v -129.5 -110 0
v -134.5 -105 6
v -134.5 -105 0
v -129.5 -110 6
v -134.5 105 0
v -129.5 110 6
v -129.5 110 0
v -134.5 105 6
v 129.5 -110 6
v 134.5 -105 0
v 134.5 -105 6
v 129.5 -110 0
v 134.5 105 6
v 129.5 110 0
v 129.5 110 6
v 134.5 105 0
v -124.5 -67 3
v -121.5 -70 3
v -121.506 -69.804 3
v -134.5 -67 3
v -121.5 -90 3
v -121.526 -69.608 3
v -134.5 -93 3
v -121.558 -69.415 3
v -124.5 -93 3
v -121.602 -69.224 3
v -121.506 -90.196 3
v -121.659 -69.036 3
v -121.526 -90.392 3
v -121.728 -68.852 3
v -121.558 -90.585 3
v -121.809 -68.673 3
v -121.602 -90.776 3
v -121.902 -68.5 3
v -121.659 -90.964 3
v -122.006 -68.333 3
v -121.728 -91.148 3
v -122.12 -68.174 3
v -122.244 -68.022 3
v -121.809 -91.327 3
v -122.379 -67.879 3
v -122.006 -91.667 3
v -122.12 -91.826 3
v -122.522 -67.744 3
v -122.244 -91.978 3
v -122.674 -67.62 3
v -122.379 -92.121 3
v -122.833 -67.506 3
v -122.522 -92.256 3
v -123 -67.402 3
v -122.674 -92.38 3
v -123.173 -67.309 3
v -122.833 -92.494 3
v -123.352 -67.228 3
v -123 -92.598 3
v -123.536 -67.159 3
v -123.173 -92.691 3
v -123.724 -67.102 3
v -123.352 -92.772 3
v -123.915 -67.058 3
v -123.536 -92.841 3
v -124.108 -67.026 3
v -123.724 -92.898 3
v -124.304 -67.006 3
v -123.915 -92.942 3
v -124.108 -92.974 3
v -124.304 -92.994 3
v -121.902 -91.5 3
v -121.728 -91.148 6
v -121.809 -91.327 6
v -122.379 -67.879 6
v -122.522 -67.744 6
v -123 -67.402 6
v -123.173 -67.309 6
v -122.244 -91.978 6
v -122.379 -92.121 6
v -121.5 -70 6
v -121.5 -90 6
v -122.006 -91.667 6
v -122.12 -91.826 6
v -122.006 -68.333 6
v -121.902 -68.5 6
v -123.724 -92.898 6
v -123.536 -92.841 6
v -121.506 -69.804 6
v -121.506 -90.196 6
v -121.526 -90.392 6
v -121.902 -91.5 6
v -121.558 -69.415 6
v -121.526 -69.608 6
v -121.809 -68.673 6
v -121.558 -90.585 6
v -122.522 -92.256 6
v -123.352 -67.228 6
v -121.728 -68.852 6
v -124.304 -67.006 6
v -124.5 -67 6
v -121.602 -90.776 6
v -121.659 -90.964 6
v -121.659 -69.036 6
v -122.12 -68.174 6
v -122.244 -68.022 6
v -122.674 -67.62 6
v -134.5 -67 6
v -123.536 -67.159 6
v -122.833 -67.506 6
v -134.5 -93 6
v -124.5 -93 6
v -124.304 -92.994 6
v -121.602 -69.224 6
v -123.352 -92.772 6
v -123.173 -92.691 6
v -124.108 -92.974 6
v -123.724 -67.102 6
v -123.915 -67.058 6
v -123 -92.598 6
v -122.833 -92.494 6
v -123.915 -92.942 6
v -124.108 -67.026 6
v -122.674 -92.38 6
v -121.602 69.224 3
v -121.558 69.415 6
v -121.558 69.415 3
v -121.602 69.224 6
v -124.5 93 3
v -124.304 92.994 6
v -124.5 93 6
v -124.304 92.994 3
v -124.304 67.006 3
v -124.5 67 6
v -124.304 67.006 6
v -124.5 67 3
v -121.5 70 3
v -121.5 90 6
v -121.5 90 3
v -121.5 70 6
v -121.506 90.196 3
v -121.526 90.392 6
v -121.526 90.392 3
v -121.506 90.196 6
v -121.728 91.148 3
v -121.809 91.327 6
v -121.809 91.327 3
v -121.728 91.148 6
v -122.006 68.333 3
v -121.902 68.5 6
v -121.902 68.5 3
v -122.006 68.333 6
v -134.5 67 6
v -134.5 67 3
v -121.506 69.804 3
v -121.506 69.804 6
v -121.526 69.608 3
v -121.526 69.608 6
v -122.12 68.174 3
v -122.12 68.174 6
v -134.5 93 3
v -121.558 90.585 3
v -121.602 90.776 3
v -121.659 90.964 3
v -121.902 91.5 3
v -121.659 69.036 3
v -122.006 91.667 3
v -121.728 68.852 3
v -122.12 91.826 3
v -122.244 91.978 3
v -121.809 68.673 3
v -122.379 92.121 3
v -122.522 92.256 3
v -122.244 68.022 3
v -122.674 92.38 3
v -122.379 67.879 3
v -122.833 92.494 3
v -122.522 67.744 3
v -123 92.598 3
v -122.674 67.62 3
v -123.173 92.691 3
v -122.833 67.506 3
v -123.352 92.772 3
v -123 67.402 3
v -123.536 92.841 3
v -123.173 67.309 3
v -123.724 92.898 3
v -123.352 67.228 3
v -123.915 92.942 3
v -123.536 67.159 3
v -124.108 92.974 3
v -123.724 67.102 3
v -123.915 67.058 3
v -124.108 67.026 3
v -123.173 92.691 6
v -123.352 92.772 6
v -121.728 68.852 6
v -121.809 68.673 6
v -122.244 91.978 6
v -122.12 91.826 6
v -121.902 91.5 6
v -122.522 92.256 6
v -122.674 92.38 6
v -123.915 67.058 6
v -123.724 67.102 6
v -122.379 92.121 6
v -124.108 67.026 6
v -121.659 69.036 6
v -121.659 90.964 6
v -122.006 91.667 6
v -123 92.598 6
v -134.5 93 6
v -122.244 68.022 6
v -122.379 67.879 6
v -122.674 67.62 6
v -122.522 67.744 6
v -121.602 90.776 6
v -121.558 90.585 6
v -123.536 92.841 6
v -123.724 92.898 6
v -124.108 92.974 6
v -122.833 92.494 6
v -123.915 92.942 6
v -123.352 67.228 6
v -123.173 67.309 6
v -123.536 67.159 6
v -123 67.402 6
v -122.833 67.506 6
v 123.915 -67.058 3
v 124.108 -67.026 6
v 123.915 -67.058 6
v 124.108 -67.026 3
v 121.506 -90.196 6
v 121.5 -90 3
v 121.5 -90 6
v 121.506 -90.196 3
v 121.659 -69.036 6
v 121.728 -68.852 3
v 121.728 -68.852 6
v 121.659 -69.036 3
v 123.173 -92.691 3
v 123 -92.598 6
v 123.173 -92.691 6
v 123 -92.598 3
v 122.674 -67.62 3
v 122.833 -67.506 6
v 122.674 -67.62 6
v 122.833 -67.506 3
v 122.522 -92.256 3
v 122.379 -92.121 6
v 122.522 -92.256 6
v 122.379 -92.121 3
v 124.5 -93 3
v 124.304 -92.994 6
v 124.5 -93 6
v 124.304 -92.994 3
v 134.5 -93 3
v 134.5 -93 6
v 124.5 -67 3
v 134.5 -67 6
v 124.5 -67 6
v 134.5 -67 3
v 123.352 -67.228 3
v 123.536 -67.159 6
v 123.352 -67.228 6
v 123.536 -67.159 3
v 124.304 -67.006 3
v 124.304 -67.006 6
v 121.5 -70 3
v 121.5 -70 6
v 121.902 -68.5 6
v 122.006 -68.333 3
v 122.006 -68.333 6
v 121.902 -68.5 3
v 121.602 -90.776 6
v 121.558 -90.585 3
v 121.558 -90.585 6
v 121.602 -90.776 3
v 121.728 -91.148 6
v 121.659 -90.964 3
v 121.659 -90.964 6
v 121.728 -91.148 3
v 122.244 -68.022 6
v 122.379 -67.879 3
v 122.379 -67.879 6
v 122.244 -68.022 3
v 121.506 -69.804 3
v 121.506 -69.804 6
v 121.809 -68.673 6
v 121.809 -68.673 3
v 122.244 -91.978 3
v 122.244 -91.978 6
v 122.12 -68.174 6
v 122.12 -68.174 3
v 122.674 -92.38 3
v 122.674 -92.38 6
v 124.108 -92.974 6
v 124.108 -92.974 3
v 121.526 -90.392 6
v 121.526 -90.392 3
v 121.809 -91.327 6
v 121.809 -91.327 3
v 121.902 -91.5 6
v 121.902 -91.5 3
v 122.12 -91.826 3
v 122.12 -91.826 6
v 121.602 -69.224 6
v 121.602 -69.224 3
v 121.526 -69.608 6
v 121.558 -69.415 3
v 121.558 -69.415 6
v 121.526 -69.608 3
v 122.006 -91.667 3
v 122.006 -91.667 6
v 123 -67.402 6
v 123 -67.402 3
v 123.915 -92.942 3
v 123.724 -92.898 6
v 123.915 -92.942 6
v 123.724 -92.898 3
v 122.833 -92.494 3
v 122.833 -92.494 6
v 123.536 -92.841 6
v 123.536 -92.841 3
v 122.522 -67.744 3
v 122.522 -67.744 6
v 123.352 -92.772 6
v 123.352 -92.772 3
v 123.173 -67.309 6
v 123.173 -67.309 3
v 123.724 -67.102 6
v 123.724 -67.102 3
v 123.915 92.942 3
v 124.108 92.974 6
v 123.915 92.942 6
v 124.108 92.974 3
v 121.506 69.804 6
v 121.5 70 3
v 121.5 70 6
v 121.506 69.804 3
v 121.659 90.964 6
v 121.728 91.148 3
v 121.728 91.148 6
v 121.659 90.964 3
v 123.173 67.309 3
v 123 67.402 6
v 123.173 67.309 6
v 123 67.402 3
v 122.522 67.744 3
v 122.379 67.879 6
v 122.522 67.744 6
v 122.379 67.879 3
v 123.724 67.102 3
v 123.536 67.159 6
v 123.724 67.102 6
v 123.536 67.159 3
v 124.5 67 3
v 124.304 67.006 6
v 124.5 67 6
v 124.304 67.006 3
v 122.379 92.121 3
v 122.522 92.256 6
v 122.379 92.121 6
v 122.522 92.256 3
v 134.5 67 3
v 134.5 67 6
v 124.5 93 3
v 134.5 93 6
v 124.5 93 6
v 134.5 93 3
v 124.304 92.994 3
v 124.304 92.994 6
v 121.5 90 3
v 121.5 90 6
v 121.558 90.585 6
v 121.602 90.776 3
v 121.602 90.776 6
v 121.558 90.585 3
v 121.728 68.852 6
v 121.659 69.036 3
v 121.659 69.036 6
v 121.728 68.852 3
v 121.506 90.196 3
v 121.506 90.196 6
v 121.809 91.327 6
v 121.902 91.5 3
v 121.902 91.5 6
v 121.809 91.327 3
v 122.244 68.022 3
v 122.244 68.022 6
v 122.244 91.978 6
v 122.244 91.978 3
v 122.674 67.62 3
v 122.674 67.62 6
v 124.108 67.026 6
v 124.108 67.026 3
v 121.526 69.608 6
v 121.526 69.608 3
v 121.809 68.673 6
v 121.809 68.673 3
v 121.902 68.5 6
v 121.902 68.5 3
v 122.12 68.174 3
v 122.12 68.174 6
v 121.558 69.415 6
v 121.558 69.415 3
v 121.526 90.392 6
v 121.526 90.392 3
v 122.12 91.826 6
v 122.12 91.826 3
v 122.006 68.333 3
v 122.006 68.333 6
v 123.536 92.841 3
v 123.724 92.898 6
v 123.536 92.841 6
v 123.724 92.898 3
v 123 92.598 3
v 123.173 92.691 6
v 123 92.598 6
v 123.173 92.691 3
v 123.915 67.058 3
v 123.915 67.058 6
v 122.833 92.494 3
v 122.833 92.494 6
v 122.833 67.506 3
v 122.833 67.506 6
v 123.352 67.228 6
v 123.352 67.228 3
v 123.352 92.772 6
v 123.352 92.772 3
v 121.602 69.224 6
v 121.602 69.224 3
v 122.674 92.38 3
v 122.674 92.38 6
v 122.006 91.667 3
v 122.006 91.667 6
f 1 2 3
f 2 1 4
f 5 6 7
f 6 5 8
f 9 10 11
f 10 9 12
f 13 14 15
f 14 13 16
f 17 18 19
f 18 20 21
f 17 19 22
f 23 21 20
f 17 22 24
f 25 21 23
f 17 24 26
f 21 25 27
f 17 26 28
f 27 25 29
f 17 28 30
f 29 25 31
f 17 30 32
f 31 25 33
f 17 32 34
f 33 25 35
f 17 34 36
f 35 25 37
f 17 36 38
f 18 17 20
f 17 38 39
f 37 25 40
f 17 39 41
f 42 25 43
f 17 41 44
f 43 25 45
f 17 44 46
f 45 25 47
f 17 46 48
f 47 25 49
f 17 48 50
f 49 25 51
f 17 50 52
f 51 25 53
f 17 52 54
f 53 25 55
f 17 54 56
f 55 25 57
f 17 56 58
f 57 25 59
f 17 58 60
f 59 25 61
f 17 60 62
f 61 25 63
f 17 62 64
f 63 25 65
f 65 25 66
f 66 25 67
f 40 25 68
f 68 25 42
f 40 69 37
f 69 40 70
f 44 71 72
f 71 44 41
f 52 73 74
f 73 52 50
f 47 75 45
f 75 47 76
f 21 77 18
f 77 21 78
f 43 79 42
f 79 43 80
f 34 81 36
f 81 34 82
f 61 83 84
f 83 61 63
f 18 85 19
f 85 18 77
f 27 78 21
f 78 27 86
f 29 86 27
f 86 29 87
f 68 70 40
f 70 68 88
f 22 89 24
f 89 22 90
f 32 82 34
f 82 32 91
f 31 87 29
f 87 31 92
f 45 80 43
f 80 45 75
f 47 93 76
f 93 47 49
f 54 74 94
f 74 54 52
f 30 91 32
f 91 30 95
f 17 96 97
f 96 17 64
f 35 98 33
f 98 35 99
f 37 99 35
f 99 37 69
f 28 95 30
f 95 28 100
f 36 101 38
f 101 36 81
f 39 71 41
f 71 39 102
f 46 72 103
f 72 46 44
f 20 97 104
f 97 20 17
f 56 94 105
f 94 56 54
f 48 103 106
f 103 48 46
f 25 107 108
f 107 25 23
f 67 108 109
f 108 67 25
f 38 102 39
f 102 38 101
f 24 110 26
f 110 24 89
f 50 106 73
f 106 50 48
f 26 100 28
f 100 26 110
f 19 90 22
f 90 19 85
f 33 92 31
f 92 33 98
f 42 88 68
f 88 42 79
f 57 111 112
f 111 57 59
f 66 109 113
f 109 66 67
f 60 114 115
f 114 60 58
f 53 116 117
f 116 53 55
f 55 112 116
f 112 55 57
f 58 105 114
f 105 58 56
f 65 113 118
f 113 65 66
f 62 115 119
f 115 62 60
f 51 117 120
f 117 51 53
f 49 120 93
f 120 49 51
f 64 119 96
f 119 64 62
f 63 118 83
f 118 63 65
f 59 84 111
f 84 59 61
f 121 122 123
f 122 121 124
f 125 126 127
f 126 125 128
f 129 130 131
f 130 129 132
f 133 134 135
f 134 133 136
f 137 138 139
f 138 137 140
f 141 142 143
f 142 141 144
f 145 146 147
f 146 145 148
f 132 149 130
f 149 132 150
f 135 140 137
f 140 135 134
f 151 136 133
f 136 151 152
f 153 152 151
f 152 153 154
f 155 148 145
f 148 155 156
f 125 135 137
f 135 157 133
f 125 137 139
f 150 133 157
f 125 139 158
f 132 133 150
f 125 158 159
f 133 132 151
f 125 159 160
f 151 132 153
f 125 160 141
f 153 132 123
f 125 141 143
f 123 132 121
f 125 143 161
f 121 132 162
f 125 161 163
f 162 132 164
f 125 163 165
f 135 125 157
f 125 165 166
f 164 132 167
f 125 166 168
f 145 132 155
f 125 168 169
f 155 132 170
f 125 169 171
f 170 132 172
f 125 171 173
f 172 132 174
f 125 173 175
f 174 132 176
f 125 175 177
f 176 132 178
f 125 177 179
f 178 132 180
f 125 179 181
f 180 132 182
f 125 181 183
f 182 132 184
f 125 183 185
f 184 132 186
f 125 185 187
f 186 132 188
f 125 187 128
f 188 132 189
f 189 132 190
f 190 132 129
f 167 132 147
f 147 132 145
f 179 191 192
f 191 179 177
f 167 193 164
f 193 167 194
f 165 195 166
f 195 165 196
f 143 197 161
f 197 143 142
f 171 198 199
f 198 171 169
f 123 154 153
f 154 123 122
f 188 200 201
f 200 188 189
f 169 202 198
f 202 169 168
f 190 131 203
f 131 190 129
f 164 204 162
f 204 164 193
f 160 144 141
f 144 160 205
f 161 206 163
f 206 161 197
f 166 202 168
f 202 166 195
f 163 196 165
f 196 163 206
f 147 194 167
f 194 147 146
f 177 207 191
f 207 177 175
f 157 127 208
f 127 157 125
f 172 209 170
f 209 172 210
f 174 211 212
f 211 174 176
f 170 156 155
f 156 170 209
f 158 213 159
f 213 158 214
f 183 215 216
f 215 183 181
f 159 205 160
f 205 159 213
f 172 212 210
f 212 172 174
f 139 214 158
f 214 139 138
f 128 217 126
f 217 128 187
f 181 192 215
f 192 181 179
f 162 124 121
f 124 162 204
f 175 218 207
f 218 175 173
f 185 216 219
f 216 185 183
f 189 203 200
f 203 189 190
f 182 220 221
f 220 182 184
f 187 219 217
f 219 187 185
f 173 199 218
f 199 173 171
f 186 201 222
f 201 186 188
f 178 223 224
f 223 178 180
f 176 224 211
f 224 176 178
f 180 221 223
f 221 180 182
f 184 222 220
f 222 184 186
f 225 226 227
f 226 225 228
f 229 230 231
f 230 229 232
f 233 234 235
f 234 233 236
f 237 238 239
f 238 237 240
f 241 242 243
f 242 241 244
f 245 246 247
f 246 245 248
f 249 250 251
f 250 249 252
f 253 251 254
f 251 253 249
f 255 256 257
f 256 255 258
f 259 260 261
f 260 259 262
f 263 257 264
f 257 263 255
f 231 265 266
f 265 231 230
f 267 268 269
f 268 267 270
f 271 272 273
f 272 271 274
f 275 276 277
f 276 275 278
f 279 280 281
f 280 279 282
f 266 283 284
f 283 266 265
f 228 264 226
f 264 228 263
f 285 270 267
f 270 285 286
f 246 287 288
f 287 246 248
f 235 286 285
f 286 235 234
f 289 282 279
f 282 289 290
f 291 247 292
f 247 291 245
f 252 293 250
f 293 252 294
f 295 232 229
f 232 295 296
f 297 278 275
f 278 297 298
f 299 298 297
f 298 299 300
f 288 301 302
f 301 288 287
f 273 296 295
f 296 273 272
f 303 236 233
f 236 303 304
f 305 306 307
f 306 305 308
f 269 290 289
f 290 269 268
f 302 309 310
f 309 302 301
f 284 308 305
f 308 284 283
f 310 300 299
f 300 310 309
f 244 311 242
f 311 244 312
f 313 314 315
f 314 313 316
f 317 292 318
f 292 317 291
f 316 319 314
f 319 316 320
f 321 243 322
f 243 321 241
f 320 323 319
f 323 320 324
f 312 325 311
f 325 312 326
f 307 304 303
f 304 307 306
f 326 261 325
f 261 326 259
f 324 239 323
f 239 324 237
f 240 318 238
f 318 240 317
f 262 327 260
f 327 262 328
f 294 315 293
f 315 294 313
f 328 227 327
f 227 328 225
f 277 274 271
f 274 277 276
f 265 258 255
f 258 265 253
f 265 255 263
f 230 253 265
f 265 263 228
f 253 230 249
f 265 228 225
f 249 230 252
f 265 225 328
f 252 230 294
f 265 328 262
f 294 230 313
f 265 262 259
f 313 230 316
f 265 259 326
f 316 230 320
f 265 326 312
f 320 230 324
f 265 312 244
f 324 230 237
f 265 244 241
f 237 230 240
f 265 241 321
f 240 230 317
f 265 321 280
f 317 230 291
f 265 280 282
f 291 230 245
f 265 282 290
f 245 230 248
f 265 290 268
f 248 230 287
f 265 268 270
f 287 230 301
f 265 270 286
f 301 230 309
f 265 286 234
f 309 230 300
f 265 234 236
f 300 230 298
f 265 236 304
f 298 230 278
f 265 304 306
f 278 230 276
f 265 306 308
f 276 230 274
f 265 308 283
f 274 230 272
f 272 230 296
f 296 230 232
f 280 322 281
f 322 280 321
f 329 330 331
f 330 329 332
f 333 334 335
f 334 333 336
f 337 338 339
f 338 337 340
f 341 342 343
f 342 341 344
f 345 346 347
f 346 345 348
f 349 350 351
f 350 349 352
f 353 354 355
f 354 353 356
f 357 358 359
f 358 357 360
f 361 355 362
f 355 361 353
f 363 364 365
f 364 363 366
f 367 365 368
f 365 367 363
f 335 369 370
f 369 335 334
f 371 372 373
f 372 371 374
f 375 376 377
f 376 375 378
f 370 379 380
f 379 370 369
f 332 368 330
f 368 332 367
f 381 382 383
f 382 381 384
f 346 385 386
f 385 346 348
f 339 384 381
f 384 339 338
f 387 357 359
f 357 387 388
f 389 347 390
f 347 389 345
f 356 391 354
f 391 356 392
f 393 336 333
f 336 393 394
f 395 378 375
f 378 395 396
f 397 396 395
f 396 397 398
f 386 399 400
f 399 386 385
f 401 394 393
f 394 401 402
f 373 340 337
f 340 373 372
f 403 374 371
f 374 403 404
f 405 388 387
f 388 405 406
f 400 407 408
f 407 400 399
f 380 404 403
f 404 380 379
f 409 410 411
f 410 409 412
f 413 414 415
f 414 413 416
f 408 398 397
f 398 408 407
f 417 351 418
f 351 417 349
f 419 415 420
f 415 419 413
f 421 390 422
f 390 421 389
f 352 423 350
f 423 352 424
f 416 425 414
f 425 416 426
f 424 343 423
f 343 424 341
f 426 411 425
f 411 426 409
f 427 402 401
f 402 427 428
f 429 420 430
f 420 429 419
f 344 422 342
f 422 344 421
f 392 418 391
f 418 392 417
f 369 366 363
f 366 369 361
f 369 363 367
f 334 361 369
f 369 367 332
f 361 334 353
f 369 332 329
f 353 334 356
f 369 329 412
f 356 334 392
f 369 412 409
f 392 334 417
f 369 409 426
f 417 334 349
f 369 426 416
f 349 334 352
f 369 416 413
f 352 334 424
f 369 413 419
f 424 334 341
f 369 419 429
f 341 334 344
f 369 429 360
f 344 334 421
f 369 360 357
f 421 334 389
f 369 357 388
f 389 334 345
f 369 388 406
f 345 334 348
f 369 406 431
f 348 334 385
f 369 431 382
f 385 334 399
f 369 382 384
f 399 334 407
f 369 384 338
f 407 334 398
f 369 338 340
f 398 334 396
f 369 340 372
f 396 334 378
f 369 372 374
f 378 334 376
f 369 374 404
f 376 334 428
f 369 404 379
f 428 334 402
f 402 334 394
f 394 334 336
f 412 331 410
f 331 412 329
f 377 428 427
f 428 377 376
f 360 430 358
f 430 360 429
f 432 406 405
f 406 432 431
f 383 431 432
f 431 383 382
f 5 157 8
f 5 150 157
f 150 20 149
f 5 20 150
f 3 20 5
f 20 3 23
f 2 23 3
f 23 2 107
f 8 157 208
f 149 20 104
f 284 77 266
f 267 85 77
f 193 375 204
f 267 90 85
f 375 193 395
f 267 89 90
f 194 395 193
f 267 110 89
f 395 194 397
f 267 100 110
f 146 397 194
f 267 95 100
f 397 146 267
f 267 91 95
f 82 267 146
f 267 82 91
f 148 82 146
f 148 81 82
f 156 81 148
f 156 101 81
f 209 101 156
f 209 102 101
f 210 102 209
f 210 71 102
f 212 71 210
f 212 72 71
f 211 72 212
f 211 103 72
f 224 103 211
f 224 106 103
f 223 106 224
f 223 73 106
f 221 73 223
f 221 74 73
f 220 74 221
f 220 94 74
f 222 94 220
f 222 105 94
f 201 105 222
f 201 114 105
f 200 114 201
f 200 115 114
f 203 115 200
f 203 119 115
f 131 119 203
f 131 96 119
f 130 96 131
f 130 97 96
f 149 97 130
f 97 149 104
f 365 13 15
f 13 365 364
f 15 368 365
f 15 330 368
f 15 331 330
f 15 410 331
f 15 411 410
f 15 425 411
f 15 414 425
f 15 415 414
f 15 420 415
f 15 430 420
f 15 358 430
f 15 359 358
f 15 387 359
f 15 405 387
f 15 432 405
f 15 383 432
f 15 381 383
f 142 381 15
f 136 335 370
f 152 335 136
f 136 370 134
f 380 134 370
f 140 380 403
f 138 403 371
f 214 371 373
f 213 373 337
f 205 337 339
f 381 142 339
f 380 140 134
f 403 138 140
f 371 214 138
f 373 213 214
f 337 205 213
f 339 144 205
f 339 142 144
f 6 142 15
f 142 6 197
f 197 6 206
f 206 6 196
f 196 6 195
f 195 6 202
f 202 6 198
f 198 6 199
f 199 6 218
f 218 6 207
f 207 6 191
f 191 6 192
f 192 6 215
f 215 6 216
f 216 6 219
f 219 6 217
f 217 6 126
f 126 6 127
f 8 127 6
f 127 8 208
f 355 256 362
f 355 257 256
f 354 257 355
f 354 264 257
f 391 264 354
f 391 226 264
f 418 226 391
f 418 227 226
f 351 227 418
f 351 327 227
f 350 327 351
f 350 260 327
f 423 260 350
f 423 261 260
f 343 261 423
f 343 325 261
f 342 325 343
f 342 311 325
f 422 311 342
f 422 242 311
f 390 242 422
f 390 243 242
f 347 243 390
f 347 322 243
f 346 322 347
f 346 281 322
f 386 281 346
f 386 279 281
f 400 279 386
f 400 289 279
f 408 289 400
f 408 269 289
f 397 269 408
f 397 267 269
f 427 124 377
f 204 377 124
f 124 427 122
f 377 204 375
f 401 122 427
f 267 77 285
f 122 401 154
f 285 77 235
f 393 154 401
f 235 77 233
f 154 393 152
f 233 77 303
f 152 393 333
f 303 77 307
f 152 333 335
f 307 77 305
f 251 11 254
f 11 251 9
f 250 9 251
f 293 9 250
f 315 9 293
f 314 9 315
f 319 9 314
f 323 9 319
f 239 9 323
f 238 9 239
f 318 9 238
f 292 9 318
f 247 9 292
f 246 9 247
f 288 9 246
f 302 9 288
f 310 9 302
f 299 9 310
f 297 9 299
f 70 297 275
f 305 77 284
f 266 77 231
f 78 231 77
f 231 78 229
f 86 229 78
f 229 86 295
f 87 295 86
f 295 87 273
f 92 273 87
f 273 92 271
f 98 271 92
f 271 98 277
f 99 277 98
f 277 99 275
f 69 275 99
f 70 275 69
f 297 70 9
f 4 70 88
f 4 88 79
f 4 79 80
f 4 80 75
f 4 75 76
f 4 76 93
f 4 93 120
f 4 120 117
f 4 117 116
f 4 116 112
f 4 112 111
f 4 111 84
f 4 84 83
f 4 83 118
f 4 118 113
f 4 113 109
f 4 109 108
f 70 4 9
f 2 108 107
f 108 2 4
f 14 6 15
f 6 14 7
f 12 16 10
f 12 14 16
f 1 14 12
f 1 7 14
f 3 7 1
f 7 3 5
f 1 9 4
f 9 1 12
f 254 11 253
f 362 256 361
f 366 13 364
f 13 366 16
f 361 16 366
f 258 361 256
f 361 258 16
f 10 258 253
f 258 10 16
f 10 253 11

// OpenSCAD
// file: ../OpenSCAD_Modules/cube_vround.scad
module cube_vround(
	size=[10,10,10],
	round_corners=[true,true,true,true],
	rounding=3,
	center_xy=false,
	center_z=false,
	attach=0,
	wall_attach=0,
	quality=2, //integer from 1 to infinity
)
{
	assert(len(size)==3);
	assert(len(round_corners)==4);
	assert(rounding>0);
	assert(rounding<=size[0]/2);
	assert(rounding<=size[1]/2);
	assert(quality>0);
	assert(attach>=0);
	assert(wall_attach>=0);
	height=size[2]+attach;
	cyl_r=rounding+wall_attach;
	cyl_mvx=size[0]/2-rounding;
	cyl_mvy=size[1]/2-rounding;
	cube_szx=size[0]/2;
	cube_szy=size[1]/2;
	cube_mvx=cube_szx/2+wall_attach;
	cube_mvy=cube_szy/2+wall_attach;
	translate([center_xy?0:cube_szx,center_xy?0:cube_szy,center_z?-attach/2:(size[2]-attach)/2])
		hull()
		{
			if(round_corners[0])
				translate([cyl_mvx,cyl_mvy])
					cylinder(r=cyl_r,h=height,$fn=12*quality,center=true);
			else
				translate([cube_mvx,cube_mvy])
					cube([cube_szx,cube_szy,height],center=true);
			if(round_corners[1])
				translate([cyl_mvx,-cyl_mvy])
					cylinder(r=cyl_r,h=height,$fn=12*quality,center=true);
			else
				translate([cube_mvx,-cube_mvy])
					cube([cube_szx,cube_szy,height],center=true);
			if(round_corners[2])
				translate([-cyl_mvx,-cyl_mvy])
					cylinder(r=cyl_r,h=height,$fn=12*quality,center=true);
			else
				translate([-cube_mvx,-cube_mvy])
					cube([cube_szx,cube_szy,height],center=true);
			if(round_corners[3])
				translate([-cyl_mvx,cyl_mvy])
					cylinder(r=cyl_r,h=height,$fn=12*quality,center=true);
			else
				translate([-cube_mvx,cube_mvy])
					cube([cube_szx,cube_szy,height],center=true);
		};
}

//example
cube_vround(round_corners=[true,false,true,false],
size=[10,20,6],
attach=0.1,
wall_attach=0.1,
rounding=3,
center_xy=true,center_z=false);
// main file
use <../OpenSCAD_Modules/cube_vround.scad>

module plate
(
	size=[269,220,6],
	outer_cut_sz=5,
	clip_cut_sz=[13,20,3],
	clip_shift=160,
	clip_rounding=3,
	quality=8,
)
{
	cutClr=1;
	difference()
	{
		//base
		cube_vround(
			size=size,
			round_corners=[false,false,false,false],
			center_xy=true,quality=quality
		);
		//corner cuts
		for(i=[-1:2:1],j=[-1:2:1])
		translate([size[0]/2*i,size[1]/2*j,-cutClr])
		rotate(v=[0,0,1],a=
			(i>0&&j>0)?180:
			(i<0&&j<0)?0:
			(i>0&&j<0)?90:270)
		linear_extrude(height=size[2]+2*cutClr)
		polygon(points=[
			[-cutClr,-cutClr],
			[-cutClr,outer_cut_sz],
			[0,outer_cut_sz],
			[outer_cut_sz,0],
			[outer_cut_sz,-cutClr]]);
		//side clip cuts
		for(i=[-1:2:1],j=[-1:2:1])
		translate(
			[i*(size[0]/2-clip_cut_sz[0]/2+cutClr/2),
			j*clip_shift/2,
			size[2]-clip_cut_sz[2]])
		cube_vround(
			size=[clip_cut_sz[0]+cutClr,clip_cut_sz[1]+clip_rounding*2,clip_cut_sz[2]+cutClr],
			round_corners=[i<0,i<0,i>0,i>0],
			rounding=clip_rounding,
			center_xy=true,
			quality=quality
		);
	}

}

plate();
